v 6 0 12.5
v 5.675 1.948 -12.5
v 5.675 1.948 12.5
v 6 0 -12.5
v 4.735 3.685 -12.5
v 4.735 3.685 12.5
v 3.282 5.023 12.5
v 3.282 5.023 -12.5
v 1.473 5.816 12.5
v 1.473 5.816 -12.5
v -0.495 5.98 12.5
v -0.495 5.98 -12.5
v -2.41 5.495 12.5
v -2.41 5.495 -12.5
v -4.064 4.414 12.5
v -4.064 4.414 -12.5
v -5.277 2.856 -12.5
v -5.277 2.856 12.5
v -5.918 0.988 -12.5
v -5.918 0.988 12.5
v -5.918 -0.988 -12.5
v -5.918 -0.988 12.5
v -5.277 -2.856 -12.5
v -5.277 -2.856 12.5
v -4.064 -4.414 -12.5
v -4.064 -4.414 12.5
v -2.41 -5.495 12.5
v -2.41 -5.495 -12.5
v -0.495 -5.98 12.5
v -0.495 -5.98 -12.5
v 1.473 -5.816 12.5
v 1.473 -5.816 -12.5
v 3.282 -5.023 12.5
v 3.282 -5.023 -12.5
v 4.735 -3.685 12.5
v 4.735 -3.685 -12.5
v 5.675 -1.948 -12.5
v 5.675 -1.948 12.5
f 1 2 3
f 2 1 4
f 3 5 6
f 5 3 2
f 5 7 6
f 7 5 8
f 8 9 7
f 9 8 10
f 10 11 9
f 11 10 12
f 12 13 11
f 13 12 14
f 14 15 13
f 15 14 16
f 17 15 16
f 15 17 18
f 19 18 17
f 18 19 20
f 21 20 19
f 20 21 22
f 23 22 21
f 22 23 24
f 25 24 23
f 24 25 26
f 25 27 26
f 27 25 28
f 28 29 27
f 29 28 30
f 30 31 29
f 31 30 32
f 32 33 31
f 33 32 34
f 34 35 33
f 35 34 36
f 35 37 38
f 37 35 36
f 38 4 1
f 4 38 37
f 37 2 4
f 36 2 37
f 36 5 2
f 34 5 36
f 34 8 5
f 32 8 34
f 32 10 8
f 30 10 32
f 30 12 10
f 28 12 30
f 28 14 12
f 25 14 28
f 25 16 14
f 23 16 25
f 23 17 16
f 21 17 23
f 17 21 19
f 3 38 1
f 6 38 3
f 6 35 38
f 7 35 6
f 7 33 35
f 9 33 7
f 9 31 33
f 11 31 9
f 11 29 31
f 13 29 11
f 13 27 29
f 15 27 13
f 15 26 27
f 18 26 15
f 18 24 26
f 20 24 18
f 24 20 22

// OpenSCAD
// Generated by generate_scads.py
cylinder(h=25, r=6, center=true);
